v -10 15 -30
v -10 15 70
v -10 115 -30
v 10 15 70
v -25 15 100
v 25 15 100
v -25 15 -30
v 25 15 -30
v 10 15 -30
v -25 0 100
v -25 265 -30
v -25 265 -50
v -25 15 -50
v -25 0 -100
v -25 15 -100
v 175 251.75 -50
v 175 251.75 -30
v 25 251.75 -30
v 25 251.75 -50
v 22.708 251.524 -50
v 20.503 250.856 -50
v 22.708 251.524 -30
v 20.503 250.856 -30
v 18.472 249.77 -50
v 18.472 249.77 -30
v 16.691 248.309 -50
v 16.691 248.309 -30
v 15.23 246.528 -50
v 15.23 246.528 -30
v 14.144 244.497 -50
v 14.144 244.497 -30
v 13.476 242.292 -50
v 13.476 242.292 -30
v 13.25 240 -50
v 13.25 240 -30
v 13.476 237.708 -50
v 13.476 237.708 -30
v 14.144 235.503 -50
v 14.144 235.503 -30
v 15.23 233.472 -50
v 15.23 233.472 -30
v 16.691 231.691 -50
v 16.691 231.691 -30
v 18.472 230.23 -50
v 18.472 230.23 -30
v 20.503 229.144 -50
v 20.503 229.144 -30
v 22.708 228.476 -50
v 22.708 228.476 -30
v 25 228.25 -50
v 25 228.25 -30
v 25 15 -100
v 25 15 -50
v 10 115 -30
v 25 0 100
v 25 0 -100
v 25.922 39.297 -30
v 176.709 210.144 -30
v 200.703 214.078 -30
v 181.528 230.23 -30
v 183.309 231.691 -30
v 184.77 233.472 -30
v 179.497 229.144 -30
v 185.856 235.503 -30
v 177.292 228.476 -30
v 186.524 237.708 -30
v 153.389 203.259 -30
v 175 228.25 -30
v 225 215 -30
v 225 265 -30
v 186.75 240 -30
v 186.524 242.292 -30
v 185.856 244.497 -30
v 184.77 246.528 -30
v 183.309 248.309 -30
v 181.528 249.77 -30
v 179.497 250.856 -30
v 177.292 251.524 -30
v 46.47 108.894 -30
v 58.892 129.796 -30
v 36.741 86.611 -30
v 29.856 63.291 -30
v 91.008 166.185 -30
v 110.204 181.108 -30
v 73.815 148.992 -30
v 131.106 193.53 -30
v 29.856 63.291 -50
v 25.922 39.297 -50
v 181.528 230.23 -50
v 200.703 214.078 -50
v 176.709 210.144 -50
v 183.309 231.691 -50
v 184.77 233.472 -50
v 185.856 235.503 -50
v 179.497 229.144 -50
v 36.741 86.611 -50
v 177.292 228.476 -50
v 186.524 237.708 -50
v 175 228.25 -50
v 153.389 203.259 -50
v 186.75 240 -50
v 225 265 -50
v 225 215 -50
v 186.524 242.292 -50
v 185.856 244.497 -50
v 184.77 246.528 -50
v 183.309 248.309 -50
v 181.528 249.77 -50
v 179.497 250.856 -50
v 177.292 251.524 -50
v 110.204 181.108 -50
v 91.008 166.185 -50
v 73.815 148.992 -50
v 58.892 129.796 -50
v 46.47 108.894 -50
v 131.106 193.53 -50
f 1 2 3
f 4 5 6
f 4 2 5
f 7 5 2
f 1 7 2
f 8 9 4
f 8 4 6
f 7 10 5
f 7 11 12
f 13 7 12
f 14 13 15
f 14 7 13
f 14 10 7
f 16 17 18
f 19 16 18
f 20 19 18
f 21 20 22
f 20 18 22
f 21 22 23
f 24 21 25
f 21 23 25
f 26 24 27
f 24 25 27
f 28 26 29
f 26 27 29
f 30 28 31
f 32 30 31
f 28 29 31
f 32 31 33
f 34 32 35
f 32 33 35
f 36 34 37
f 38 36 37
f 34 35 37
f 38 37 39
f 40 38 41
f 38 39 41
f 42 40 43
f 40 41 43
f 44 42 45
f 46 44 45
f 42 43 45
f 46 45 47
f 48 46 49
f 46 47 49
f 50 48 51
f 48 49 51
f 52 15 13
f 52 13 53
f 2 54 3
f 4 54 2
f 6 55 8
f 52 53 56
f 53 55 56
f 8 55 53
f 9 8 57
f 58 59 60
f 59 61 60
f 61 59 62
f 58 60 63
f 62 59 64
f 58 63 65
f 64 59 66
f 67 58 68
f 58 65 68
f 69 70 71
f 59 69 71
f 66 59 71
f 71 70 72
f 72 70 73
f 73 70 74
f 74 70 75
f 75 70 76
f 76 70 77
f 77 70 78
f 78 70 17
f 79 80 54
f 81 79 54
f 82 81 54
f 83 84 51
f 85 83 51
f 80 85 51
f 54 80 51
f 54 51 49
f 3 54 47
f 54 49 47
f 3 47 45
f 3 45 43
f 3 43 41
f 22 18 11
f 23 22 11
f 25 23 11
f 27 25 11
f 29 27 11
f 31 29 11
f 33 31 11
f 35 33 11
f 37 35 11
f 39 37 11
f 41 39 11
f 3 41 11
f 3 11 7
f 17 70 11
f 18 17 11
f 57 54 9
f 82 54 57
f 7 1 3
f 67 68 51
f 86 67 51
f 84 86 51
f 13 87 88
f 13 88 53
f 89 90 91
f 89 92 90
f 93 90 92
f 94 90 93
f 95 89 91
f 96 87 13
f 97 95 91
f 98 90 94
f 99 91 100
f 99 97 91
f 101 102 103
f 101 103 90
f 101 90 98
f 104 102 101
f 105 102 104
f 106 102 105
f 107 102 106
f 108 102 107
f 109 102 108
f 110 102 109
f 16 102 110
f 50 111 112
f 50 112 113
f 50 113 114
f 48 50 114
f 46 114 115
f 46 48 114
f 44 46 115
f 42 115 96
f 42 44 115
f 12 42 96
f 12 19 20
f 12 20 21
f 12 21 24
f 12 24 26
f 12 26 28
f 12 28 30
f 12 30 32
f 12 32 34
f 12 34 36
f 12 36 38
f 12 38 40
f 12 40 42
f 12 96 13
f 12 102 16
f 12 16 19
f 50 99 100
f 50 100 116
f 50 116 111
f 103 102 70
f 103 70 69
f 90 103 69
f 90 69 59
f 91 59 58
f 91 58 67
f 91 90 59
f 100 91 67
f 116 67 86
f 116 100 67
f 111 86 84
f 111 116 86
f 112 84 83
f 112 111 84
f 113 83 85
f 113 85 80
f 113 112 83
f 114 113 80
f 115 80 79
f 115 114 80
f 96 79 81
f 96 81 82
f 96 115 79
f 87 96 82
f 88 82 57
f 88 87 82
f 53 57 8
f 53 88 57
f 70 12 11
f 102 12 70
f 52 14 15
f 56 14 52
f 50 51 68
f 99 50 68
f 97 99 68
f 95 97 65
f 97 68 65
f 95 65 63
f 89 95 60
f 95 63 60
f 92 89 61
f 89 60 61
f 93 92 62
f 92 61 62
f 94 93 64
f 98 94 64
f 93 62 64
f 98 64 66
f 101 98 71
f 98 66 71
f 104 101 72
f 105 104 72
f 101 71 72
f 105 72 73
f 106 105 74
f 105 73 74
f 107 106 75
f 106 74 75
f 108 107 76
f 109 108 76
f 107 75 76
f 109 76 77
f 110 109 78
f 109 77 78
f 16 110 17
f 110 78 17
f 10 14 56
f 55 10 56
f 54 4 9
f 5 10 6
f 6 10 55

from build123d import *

# Parameters (mm, degrees)
SKETCH1_W           = 50
SKETCH1_H           = 200
BOSS_EXTRUDE1_DEPTH = 15
BOSS_EXTRUDE2_DEPTH = 20
BOSS_EXTRUDE3_DEPTH = 10
CUT_EXTRUDE1_DEPTH  = 71


with BuildPart() as part:
    # Sketch1 → Boss-Extrude1 (new body)
    with BuildSketch(Plane(origin=(0, 0, 0), x_dir=(1, 0, 0), z_dir=(0, 1, 0))):
        Rectangle(SKETCH1_W, SKETCH1_H)
    extrude(amount=BOSS_EXTRUDE1_DEPTH)

    # Sketch2 → Boss-Extrude2 (add)
    with BuildSketch(Plane.XY.offset(-50)):
        with BuildLine():
            Line((-25, 15), (-25, 265))
            Line((-25, 265), (225, 265))
            Line((225, 265), (225, 215))
            ThreePointArc((225, 215), (82.144079422, 157.855920578), (25, 15))
            Line((25, 15), (-25, 15))
        make_face()
    extrude(amount=BOSS_EXTRUDE2_DEPTH)

    # Sketch3 → Boss-Extrude3 (add, symmetric)
    with BuildSketch(Plane(origin=(0, 0, 0), x_dir=(0, 0, -1), z_dir=(1, 0, 0))):
        Polygon((-70, 15), (30, 15), (30, 115), align=None)
    extrude(amount=BOSS_EXTRUDE3_DEPTH, both=True)

    # Sketch4 → Cut-Extrude1 (cut, through all)
    with BuildSketch(Plane.XY.offset(-30)):
        with BuildLine():
            Line((25, 228.25), (175, 228.25))
            ThreePointArc((175, 228.25), (186.75, 240), (175, 251.75))
            Line((175, 251.75), (25, 251.75))
            ThreePointArc((25, 251.75), (13.25, 240), (25, 228.25))
        make_face()
    extrude(amount=-CUT_EXTRUDE1_DEPTH, mode=Mode.SUBTRACT)


solid = part.part
